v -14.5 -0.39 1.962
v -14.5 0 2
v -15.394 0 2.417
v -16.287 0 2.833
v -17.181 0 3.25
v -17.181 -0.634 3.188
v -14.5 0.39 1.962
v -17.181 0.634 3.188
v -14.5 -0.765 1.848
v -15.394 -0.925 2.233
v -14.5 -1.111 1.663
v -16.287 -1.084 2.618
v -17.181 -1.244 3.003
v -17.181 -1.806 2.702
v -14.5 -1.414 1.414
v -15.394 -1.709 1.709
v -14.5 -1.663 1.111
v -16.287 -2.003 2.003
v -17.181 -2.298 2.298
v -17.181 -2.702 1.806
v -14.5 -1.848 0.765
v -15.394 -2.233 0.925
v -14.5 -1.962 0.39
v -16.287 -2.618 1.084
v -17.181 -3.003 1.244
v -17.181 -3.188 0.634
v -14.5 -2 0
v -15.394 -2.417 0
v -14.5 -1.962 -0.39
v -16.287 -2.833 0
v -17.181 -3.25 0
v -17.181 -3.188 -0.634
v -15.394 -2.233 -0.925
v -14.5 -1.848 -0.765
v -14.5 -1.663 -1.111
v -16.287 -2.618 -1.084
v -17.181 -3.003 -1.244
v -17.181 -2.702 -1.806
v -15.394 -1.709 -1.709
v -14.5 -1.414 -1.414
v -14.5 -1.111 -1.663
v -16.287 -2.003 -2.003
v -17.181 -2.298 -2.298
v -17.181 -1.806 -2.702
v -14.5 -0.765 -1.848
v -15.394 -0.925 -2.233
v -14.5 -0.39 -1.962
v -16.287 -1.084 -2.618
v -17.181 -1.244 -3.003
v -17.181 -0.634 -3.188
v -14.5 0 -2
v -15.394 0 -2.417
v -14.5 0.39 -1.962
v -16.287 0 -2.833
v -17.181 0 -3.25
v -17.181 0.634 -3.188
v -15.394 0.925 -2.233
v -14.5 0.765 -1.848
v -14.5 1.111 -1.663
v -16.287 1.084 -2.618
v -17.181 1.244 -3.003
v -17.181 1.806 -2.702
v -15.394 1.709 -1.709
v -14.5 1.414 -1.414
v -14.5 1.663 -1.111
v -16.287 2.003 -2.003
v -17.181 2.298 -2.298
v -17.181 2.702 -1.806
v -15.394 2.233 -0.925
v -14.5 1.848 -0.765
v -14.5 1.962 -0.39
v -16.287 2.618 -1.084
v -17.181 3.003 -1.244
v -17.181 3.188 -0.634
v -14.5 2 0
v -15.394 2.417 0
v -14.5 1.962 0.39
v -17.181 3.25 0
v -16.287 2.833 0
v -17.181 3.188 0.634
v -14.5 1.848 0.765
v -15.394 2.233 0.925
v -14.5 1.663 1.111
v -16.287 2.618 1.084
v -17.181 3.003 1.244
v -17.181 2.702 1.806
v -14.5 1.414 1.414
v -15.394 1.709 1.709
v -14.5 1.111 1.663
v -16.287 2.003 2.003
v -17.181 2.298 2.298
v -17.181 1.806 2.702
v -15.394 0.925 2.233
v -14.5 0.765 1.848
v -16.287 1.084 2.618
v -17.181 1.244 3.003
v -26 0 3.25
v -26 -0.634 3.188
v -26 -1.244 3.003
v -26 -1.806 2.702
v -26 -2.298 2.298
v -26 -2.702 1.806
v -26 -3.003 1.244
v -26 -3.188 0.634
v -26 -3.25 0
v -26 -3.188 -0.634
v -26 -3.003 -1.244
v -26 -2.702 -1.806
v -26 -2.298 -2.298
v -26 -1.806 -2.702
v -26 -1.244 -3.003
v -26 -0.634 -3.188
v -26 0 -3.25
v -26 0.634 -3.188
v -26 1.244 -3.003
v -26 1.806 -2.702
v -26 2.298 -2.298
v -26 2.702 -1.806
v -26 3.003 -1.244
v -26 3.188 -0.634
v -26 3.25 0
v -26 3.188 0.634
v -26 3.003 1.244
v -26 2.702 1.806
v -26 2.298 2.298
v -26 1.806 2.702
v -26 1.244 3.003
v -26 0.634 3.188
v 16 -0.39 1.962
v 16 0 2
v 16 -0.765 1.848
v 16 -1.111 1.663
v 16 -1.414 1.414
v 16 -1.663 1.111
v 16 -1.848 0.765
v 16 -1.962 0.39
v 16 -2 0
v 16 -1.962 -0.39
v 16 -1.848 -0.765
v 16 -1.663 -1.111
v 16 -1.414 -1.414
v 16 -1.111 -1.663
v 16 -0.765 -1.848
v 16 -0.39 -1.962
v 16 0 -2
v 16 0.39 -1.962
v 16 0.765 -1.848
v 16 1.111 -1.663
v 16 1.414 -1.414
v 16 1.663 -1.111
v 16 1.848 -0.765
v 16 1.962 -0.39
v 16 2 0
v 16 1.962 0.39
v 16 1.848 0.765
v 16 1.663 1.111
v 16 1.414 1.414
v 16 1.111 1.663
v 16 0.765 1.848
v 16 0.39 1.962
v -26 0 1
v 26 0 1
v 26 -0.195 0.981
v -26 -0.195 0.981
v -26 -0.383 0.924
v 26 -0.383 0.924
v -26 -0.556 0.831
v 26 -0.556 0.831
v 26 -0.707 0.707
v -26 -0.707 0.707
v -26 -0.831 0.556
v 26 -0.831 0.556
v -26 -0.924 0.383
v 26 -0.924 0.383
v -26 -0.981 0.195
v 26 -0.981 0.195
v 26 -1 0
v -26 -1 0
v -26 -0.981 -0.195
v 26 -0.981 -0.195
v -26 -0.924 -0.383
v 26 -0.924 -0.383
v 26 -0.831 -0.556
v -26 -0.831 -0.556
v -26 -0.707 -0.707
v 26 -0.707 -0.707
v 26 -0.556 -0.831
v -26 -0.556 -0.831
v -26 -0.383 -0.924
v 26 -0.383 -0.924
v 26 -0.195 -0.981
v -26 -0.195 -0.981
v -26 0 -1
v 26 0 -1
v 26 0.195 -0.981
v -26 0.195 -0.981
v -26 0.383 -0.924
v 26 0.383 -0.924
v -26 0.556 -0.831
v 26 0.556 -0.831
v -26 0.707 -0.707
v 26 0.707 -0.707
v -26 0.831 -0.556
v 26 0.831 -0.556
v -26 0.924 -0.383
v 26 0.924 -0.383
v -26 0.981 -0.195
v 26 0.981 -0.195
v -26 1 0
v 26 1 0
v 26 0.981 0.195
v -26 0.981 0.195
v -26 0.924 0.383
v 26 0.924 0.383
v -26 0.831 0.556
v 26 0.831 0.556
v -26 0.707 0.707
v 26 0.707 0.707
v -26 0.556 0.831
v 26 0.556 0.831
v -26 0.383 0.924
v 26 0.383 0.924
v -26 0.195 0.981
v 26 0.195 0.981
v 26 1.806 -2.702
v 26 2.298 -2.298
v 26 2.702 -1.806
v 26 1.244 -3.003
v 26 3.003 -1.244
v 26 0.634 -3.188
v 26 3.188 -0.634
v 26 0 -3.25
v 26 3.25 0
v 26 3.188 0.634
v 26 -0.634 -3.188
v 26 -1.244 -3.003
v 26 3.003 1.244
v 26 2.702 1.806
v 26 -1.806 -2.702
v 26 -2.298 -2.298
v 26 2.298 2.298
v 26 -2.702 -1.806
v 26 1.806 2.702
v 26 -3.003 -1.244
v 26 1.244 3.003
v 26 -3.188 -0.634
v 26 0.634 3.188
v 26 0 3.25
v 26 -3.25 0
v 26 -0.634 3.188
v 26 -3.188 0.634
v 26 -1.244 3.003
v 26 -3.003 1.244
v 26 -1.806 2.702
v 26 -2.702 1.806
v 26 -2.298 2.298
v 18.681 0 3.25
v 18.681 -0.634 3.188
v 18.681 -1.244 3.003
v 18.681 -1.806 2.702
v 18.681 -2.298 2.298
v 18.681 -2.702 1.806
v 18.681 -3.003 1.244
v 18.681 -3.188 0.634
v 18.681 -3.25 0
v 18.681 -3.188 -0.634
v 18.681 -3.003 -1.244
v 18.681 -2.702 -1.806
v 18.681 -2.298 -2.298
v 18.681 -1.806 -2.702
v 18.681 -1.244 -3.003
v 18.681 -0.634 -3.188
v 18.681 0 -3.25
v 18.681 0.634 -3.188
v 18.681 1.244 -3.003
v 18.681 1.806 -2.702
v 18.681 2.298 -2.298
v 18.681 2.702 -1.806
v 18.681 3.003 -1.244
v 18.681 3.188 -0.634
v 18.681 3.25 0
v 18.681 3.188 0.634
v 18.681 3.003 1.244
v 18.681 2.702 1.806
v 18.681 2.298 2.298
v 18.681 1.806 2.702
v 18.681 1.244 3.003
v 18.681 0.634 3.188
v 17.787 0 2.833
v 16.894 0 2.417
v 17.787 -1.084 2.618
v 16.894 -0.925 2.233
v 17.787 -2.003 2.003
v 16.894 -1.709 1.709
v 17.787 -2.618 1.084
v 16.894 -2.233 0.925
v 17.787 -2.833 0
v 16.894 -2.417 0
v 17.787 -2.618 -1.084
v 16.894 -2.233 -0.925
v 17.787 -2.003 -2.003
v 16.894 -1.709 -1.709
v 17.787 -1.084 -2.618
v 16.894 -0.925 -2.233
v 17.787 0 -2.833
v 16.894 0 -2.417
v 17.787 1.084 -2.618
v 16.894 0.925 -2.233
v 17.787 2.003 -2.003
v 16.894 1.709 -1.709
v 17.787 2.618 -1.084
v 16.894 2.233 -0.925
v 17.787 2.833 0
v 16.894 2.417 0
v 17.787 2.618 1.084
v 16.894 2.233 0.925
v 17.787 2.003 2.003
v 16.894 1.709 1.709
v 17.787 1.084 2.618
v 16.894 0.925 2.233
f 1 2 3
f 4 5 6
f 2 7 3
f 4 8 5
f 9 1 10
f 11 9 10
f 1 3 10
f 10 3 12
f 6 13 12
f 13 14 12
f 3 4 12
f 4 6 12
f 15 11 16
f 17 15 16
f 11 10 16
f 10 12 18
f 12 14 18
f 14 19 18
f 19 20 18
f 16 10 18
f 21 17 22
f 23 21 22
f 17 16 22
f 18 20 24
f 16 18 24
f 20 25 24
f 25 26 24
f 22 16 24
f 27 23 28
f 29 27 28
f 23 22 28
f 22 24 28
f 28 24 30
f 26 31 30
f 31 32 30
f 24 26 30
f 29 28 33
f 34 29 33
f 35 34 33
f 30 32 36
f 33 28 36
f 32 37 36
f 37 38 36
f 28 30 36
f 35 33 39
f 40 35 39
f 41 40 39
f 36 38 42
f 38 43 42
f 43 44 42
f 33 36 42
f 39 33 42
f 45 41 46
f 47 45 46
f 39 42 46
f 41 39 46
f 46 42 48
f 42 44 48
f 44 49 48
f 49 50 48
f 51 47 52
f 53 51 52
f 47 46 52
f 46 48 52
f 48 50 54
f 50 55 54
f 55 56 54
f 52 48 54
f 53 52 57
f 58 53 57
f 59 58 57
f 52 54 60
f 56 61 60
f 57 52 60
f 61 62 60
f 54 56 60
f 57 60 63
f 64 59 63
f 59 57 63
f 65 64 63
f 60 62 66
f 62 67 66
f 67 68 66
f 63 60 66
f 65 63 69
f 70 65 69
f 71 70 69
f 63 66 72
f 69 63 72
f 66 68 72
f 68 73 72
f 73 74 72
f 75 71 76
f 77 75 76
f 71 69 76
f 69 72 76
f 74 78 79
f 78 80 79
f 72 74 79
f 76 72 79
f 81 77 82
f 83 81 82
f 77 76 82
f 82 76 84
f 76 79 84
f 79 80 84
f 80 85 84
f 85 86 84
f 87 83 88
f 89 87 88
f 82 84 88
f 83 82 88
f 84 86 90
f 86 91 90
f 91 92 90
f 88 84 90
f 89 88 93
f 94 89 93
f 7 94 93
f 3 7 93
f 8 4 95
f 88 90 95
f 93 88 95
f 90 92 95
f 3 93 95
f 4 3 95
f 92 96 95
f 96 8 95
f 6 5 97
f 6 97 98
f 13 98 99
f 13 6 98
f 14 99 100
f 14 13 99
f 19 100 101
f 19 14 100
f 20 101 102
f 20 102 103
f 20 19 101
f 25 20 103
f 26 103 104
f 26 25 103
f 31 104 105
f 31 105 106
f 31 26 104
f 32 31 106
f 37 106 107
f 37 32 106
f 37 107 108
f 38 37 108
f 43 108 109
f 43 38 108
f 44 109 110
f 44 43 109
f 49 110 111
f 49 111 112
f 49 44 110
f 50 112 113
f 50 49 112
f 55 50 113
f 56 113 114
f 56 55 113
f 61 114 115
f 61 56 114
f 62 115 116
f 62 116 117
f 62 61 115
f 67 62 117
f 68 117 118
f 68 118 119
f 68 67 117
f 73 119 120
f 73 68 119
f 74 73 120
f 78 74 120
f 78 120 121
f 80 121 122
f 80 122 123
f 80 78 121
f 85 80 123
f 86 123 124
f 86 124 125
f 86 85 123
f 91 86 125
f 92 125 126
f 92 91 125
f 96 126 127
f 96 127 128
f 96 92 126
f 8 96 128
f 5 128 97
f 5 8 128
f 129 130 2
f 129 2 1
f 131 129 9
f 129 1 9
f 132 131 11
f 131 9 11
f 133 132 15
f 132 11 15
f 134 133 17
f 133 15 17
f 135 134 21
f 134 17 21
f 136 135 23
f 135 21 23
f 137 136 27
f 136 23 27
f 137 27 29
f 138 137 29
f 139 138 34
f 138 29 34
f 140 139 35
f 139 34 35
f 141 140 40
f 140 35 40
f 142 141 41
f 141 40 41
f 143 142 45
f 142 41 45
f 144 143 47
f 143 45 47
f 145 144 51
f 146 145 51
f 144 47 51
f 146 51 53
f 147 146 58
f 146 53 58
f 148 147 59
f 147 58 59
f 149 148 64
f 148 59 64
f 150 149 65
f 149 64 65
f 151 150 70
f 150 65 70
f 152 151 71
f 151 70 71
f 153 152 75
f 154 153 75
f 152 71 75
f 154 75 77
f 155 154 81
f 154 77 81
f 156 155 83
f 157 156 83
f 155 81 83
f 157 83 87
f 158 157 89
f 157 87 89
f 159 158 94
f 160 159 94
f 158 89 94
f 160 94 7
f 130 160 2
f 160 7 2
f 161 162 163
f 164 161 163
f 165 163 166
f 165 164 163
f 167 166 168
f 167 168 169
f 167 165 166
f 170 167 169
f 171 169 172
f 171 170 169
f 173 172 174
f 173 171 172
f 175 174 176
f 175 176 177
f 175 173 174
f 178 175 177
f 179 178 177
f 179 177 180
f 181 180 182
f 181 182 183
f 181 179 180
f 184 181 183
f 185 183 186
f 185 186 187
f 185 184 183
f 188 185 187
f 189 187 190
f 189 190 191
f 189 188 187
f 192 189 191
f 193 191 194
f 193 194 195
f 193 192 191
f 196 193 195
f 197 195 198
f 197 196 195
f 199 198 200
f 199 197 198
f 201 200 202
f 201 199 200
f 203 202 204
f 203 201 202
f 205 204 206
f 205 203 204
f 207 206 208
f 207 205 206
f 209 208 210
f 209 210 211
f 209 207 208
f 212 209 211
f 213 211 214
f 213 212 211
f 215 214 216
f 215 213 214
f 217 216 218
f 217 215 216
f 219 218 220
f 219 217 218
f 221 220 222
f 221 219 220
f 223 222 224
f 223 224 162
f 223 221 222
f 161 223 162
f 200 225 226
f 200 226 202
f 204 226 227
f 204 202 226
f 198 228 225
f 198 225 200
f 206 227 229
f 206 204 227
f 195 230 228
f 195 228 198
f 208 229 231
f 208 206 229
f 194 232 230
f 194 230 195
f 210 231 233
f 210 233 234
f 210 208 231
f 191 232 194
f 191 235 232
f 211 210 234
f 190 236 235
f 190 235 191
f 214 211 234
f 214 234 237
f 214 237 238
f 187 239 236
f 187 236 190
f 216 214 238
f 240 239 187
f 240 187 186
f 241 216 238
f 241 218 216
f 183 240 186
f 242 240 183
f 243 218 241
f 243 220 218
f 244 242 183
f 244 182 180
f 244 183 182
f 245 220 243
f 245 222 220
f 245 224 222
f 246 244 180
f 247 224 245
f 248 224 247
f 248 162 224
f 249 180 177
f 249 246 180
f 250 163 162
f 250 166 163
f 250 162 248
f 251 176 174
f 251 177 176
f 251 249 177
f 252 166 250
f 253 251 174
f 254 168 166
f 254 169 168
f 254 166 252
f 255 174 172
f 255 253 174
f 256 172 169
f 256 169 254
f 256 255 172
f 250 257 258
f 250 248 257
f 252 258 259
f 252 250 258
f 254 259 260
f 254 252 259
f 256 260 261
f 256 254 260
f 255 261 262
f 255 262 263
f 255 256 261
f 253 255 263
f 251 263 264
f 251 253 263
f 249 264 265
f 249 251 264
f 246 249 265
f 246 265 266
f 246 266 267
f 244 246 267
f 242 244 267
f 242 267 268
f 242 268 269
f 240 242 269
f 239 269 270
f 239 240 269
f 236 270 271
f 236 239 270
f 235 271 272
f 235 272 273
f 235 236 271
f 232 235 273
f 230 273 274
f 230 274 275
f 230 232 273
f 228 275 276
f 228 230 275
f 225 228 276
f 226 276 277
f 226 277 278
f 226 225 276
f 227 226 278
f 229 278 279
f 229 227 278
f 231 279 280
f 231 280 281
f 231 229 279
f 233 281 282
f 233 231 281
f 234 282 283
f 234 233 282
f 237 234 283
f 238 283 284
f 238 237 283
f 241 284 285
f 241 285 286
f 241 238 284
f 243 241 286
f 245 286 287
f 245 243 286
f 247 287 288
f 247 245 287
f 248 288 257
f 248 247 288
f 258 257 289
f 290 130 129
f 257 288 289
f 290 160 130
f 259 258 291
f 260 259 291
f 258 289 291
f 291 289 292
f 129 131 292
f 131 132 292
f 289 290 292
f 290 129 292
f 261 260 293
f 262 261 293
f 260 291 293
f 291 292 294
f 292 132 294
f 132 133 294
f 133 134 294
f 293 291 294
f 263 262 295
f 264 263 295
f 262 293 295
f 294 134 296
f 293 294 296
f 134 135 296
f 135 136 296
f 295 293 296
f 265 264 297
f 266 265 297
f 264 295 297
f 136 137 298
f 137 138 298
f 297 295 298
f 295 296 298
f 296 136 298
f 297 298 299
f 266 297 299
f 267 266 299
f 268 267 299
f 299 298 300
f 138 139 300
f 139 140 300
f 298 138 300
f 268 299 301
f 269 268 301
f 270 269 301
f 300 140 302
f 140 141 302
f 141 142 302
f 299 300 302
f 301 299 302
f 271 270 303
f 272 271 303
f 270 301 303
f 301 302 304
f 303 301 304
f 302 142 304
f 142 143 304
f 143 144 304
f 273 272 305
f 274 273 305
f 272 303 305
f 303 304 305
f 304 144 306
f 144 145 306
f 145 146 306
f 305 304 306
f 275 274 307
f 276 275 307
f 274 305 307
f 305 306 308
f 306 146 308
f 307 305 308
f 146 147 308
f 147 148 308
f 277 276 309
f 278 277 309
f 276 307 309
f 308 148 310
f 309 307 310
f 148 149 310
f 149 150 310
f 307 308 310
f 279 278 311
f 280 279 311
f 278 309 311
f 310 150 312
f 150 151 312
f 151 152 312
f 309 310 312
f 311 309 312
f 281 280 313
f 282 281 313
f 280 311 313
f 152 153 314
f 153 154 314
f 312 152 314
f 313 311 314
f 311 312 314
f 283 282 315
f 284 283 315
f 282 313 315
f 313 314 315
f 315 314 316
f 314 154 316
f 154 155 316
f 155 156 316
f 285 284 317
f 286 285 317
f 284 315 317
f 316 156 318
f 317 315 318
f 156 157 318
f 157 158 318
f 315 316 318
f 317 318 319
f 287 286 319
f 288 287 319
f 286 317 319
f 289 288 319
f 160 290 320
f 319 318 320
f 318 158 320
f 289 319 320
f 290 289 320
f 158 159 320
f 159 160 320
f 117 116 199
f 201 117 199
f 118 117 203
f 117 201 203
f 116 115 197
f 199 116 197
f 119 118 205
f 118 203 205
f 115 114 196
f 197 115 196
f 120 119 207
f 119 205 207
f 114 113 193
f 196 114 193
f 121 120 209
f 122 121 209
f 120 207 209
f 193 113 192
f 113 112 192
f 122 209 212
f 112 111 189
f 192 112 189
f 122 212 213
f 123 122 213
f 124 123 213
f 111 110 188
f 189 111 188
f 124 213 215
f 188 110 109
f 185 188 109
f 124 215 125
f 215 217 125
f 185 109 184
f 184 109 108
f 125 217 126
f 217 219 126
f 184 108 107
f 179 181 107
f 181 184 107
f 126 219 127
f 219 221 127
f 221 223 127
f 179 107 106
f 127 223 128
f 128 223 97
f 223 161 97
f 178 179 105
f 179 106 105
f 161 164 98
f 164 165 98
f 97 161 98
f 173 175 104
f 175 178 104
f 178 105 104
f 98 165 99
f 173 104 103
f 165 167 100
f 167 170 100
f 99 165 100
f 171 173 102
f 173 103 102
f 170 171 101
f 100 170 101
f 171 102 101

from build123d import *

# Parameters (mm, degrees)
SKETCH_1_R      = 3.25
SKETCH_1_R_2    = 1
EXTRUDE_1_DEPTH = 26


with BuildPart() as part:
    # 草图1 → 凸台-拉伸1 (new, symmetric)
    with BuildSketch(Plane(origin=(0, 0, 0), x_dir=(0, 0, -1), z_dir=(1, 0, 0))):
        with Locations(Location((0, 0, 0), (0, 0, 180))):
            Circle(SKETCH_1_R)
        with Locations(Location((0, 0, 0), (0, 0, 180))):
            Circle(SKETCH_1_R_2, mode=Mode.SUBTRACT)
    extrude(amount=EXTRUDE_1_DEPTH, both=True)

    # 草图2 → 切除-旋转1 (revolve, cut)
    with BuildSketch(Plane.XY, mode=Mode.PRIVATE) as cut_revolve_1_sk:
        Polygon((-17.180633651, 3.25), (18.680633651, 3.25), (16, 2), (-14.5, 2), align=None)
    revolve(cut_revolve_1_sk.sketch.rotate(Axis((-26, 0, 0), (1, 0, 0)), 90), axis=Axis((-26, 0, 0), (1, 0, 0)), mode=Mode.SUBTRACT)


solid = part.part
